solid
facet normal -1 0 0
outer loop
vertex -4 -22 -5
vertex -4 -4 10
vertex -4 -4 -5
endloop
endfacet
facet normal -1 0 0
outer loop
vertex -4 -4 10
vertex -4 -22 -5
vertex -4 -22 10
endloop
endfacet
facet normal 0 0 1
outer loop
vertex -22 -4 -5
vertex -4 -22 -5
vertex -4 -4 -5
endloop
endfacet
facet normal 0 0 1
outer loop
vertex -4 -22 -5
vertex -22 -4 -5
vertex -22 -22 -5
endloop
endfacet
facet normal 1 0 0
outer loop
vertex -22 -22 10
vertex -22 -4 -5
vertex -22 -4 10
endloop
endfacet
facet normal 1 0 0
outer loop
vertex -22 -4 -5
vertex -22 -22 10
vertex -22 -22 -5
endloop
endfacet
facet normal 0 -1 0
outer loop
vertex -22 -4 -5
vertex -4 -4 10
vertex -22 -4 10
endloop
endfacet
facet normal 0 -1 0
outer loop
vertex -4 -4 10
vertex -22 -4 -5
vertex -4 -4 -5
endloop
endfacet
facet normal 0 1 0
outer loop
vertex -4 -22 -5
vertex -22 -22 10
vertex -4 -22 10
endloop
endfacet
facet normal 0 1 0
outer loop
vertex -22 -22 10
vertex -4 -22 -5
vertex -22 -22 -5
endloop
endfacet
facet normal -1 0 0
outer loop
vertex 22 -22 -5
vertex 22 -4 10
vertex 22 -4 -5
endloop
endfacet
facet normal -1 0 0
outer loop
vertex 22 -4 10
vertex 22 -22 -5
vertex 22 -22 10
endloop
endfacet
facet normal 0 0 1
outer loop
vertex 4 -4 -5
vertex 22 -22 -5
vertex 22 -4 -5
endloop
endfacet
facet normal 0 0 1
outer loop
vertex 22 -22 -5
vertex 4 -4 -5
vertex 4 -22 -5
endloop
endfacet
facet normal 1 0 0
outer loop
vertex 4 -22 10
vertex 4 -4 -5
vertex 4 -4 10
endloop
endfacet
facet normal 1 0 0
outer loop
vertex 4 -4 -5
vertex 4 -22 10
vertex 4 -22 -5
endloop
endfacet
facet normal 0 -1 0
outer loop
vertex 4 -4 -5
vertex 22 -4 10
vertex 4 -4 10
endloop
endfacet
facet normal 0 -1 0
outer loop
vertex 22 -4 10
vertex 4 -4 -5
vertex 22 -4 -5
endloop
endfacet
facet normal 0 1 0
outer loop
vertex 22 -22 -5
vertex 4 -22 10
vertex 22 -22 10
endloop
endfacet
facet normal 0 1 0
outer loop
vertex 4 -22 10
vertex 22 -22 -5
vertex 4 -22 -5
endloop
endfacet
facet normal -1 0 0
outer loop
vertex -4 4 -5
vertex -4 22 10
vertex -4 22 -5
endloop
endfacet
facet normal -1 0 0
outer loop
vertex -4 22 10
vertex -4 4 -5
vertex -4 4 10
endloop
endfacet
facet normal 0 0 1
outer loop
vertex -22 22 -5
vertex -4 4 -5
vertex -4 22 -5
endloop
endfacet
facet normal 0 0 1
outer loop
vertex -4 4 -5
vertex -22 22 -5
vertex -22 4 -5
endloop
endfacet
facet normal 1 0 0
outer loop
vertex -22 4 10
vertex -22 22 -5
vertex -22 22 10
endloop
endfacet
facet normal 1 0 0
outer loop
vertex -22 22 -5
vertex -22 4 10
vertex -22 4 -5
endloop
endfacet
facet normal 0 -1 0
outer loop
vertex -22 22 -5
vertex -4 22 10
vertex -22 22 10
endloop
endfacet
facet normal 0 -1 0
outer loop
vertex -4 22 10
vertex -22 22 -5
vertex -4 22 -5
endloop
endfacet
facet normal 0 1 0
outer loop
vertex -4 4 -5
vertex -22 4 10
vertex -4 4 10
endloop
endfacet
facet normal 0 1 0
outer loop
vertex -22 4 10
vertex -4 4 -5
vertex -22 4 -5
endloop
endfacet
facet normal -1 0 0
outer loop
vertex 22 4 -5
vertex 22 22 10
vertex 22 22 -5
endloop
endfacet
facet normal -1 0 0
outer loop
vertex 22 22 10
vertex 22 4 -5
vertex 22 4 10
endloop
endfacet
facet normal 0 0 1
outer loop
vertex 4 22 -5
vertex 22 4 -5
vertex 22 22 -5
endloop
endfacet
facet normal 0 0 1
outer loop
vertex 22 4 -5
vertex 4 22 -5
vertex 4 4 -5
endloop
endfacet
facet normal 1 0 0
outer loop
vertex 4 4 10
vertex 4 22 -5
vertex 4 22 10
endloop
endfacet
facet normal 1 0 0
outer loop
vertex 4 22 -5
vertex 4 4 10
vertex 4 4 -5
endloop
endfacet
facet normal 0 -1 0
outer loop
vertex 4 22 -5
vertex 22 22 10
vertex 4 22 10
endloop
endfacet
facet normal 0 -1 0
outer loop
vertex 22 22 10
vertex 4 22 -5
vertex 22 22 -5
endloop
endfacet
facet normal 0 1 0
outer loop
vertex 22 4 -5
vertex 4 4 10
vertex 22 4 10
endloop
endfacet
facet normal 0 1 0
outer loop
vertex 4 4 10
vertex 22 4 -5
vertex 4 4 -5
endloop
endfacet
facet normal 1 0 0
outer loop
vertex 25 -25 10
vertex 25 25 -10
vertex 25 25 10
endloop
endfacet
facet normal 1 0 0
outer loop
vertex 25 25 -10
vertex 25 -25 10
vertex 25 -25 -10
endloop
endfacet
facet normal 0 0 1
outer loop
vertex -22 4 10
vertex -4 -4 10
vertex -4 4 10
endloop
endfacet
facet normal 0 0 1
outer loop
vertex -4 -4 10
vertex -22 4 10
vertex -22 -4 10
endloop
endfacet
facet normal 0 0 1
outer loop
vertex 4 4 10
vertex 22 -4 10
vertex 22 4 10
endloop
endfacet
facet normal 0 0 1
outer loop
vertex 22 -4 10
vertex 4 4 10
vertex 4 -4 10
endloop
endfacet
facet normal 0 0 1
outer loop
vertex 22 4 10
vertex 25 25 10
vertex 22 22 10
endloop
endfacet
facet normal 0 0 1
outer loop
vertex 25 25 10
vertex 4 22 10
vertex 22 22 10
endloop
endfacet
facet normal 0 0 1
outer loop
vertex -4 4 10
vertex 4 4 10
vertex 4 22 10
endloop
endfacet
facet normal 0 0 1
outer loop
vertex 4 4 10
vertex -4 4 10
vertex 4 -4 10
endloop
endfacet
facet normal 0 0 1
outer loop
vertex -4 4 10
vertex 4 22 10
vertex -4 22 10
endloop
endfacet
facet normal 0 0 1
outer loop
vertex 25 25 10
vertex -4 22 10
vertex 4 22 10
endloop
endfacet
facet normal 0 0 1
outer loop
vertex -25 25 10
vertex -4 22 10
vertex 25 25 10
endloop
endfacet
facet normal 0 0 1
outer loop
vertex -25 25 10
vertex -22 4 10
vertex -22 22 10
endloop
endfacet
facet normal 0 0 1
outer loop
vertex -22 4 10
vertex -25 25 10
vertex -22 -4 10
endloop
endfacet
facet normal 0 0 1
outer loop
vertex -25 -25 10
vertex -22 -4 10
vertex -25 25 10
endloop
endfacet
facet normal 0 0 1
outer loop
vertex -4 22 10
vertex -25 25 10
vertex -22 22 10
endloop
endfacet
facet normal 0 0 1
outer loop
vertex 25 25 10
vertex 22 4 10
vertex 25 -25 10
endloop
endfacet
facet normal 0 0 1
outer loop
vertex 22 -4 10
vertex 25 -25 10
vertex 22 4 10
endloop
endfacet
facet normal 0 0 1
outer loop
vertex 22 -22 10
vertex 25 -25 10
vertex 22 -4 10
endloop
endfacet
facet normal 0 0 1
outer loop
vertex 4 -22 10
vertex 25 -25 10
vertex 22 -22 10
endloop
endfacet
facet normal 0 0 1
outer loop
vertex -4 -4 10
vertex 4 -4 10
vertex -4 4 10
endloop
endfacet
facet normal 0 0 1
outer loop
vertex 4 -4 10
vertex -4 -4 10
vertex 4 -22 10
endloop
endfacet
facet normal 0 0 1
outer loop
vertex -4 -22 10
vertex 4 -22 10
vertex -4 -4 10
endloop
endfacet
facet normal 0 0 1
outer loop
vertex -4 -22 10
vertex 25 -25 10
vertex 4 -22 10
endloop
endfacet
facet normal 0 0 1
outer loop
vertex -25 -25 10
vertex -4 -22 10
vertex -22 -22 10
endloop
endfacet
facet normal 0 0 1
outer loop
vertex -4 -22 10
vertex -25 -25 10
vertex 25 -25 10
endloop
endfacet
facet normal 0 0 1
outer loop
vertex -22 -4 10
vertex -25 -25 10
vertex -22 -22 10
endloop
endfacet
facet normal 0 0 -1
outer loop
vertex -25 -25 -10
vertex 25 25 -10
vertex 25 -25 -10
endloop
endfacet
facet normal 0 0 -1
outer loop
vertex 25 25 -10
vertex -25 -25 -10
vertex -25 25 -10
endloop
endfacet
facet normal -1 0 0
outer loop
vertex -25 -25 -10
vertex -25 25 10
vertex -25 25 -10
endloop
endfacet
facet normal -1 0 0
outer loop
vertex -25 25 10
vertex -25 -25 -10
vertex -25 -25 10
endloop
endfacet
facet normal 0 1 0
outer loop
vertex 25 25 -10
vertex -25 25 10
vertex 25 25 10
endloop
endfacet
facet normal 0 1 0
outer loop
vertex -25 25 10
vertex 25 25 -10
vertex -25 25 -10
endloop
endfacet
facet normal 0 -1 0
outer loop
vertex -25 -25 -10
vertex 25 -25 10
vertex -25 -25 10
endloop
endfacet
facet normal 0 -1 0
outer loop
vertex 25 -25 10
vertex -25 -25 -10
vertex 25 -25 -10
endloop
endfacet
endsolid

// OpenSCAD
$fn = 32;

// ----------------------------------------------------------------------
// Pocket plate 50 x 50 x 20
// 2 x 2 pockets 18 mm square, 15 mm deep
// ----------------------------------------------------------------------

// --- parameters (mm) ---
thickness = 20;  // plate thickness
floor_t = 5;     // material left under each pocket
pocket = 18;     // pocket side length
pitch_x = 26;    // pocket pitch along X
pitch_y = 26;    // pocket pitch along Y
cols = 2;        // pockets per row
rows = 2;        // rows of pockets

// --- derived feature positions (mm) ---
depth = thickness - floor_t;        // = 15   pocket depth, down to the floor
span_x = (cols - 1) * pitch_x;      // = 26   distance between outer pockets
span_y = (rows - 1) * pitch_y;      // = 26   distance between outer pocket rows
origin_x = -span_x / 2;             // = -13   X of the first pocket
origin_y = -span_y / 2;             // = -13   Y of the first pocket
plate = [span_x + pocket + 6, span_y + pocket + 6, thickness];  // = [50, 50, 20]   overall size: pockets plus 3 mm of wall on each side
feature_centers = [
  [origin_x + 0 * pitch_x, origin_y + 0 * pitch_y],
  [origin_x + 1 * pitch_x, origin_y + 0 * pitch_y],
  [origin_x + 0 * pitch_x, origin_y + 1 * pitch_y],
  [origin_x + 1 * pitch_x, origin_y + 1 * pitch_y]
];   // pocket centres, used verbatim by the cutter loop

// plate outline, then one pocket per centre in feature_centers
difference() {
  cube(plate, center = true);
  for (centre = feature_centers)
    translate([centre[0] - pocket / 2, centre[1] - pocket / 2, plate[2] / 2 - depth])
      cube([pocket, pocket, depth + 1]);  // centred on the declared pocket centre
}
